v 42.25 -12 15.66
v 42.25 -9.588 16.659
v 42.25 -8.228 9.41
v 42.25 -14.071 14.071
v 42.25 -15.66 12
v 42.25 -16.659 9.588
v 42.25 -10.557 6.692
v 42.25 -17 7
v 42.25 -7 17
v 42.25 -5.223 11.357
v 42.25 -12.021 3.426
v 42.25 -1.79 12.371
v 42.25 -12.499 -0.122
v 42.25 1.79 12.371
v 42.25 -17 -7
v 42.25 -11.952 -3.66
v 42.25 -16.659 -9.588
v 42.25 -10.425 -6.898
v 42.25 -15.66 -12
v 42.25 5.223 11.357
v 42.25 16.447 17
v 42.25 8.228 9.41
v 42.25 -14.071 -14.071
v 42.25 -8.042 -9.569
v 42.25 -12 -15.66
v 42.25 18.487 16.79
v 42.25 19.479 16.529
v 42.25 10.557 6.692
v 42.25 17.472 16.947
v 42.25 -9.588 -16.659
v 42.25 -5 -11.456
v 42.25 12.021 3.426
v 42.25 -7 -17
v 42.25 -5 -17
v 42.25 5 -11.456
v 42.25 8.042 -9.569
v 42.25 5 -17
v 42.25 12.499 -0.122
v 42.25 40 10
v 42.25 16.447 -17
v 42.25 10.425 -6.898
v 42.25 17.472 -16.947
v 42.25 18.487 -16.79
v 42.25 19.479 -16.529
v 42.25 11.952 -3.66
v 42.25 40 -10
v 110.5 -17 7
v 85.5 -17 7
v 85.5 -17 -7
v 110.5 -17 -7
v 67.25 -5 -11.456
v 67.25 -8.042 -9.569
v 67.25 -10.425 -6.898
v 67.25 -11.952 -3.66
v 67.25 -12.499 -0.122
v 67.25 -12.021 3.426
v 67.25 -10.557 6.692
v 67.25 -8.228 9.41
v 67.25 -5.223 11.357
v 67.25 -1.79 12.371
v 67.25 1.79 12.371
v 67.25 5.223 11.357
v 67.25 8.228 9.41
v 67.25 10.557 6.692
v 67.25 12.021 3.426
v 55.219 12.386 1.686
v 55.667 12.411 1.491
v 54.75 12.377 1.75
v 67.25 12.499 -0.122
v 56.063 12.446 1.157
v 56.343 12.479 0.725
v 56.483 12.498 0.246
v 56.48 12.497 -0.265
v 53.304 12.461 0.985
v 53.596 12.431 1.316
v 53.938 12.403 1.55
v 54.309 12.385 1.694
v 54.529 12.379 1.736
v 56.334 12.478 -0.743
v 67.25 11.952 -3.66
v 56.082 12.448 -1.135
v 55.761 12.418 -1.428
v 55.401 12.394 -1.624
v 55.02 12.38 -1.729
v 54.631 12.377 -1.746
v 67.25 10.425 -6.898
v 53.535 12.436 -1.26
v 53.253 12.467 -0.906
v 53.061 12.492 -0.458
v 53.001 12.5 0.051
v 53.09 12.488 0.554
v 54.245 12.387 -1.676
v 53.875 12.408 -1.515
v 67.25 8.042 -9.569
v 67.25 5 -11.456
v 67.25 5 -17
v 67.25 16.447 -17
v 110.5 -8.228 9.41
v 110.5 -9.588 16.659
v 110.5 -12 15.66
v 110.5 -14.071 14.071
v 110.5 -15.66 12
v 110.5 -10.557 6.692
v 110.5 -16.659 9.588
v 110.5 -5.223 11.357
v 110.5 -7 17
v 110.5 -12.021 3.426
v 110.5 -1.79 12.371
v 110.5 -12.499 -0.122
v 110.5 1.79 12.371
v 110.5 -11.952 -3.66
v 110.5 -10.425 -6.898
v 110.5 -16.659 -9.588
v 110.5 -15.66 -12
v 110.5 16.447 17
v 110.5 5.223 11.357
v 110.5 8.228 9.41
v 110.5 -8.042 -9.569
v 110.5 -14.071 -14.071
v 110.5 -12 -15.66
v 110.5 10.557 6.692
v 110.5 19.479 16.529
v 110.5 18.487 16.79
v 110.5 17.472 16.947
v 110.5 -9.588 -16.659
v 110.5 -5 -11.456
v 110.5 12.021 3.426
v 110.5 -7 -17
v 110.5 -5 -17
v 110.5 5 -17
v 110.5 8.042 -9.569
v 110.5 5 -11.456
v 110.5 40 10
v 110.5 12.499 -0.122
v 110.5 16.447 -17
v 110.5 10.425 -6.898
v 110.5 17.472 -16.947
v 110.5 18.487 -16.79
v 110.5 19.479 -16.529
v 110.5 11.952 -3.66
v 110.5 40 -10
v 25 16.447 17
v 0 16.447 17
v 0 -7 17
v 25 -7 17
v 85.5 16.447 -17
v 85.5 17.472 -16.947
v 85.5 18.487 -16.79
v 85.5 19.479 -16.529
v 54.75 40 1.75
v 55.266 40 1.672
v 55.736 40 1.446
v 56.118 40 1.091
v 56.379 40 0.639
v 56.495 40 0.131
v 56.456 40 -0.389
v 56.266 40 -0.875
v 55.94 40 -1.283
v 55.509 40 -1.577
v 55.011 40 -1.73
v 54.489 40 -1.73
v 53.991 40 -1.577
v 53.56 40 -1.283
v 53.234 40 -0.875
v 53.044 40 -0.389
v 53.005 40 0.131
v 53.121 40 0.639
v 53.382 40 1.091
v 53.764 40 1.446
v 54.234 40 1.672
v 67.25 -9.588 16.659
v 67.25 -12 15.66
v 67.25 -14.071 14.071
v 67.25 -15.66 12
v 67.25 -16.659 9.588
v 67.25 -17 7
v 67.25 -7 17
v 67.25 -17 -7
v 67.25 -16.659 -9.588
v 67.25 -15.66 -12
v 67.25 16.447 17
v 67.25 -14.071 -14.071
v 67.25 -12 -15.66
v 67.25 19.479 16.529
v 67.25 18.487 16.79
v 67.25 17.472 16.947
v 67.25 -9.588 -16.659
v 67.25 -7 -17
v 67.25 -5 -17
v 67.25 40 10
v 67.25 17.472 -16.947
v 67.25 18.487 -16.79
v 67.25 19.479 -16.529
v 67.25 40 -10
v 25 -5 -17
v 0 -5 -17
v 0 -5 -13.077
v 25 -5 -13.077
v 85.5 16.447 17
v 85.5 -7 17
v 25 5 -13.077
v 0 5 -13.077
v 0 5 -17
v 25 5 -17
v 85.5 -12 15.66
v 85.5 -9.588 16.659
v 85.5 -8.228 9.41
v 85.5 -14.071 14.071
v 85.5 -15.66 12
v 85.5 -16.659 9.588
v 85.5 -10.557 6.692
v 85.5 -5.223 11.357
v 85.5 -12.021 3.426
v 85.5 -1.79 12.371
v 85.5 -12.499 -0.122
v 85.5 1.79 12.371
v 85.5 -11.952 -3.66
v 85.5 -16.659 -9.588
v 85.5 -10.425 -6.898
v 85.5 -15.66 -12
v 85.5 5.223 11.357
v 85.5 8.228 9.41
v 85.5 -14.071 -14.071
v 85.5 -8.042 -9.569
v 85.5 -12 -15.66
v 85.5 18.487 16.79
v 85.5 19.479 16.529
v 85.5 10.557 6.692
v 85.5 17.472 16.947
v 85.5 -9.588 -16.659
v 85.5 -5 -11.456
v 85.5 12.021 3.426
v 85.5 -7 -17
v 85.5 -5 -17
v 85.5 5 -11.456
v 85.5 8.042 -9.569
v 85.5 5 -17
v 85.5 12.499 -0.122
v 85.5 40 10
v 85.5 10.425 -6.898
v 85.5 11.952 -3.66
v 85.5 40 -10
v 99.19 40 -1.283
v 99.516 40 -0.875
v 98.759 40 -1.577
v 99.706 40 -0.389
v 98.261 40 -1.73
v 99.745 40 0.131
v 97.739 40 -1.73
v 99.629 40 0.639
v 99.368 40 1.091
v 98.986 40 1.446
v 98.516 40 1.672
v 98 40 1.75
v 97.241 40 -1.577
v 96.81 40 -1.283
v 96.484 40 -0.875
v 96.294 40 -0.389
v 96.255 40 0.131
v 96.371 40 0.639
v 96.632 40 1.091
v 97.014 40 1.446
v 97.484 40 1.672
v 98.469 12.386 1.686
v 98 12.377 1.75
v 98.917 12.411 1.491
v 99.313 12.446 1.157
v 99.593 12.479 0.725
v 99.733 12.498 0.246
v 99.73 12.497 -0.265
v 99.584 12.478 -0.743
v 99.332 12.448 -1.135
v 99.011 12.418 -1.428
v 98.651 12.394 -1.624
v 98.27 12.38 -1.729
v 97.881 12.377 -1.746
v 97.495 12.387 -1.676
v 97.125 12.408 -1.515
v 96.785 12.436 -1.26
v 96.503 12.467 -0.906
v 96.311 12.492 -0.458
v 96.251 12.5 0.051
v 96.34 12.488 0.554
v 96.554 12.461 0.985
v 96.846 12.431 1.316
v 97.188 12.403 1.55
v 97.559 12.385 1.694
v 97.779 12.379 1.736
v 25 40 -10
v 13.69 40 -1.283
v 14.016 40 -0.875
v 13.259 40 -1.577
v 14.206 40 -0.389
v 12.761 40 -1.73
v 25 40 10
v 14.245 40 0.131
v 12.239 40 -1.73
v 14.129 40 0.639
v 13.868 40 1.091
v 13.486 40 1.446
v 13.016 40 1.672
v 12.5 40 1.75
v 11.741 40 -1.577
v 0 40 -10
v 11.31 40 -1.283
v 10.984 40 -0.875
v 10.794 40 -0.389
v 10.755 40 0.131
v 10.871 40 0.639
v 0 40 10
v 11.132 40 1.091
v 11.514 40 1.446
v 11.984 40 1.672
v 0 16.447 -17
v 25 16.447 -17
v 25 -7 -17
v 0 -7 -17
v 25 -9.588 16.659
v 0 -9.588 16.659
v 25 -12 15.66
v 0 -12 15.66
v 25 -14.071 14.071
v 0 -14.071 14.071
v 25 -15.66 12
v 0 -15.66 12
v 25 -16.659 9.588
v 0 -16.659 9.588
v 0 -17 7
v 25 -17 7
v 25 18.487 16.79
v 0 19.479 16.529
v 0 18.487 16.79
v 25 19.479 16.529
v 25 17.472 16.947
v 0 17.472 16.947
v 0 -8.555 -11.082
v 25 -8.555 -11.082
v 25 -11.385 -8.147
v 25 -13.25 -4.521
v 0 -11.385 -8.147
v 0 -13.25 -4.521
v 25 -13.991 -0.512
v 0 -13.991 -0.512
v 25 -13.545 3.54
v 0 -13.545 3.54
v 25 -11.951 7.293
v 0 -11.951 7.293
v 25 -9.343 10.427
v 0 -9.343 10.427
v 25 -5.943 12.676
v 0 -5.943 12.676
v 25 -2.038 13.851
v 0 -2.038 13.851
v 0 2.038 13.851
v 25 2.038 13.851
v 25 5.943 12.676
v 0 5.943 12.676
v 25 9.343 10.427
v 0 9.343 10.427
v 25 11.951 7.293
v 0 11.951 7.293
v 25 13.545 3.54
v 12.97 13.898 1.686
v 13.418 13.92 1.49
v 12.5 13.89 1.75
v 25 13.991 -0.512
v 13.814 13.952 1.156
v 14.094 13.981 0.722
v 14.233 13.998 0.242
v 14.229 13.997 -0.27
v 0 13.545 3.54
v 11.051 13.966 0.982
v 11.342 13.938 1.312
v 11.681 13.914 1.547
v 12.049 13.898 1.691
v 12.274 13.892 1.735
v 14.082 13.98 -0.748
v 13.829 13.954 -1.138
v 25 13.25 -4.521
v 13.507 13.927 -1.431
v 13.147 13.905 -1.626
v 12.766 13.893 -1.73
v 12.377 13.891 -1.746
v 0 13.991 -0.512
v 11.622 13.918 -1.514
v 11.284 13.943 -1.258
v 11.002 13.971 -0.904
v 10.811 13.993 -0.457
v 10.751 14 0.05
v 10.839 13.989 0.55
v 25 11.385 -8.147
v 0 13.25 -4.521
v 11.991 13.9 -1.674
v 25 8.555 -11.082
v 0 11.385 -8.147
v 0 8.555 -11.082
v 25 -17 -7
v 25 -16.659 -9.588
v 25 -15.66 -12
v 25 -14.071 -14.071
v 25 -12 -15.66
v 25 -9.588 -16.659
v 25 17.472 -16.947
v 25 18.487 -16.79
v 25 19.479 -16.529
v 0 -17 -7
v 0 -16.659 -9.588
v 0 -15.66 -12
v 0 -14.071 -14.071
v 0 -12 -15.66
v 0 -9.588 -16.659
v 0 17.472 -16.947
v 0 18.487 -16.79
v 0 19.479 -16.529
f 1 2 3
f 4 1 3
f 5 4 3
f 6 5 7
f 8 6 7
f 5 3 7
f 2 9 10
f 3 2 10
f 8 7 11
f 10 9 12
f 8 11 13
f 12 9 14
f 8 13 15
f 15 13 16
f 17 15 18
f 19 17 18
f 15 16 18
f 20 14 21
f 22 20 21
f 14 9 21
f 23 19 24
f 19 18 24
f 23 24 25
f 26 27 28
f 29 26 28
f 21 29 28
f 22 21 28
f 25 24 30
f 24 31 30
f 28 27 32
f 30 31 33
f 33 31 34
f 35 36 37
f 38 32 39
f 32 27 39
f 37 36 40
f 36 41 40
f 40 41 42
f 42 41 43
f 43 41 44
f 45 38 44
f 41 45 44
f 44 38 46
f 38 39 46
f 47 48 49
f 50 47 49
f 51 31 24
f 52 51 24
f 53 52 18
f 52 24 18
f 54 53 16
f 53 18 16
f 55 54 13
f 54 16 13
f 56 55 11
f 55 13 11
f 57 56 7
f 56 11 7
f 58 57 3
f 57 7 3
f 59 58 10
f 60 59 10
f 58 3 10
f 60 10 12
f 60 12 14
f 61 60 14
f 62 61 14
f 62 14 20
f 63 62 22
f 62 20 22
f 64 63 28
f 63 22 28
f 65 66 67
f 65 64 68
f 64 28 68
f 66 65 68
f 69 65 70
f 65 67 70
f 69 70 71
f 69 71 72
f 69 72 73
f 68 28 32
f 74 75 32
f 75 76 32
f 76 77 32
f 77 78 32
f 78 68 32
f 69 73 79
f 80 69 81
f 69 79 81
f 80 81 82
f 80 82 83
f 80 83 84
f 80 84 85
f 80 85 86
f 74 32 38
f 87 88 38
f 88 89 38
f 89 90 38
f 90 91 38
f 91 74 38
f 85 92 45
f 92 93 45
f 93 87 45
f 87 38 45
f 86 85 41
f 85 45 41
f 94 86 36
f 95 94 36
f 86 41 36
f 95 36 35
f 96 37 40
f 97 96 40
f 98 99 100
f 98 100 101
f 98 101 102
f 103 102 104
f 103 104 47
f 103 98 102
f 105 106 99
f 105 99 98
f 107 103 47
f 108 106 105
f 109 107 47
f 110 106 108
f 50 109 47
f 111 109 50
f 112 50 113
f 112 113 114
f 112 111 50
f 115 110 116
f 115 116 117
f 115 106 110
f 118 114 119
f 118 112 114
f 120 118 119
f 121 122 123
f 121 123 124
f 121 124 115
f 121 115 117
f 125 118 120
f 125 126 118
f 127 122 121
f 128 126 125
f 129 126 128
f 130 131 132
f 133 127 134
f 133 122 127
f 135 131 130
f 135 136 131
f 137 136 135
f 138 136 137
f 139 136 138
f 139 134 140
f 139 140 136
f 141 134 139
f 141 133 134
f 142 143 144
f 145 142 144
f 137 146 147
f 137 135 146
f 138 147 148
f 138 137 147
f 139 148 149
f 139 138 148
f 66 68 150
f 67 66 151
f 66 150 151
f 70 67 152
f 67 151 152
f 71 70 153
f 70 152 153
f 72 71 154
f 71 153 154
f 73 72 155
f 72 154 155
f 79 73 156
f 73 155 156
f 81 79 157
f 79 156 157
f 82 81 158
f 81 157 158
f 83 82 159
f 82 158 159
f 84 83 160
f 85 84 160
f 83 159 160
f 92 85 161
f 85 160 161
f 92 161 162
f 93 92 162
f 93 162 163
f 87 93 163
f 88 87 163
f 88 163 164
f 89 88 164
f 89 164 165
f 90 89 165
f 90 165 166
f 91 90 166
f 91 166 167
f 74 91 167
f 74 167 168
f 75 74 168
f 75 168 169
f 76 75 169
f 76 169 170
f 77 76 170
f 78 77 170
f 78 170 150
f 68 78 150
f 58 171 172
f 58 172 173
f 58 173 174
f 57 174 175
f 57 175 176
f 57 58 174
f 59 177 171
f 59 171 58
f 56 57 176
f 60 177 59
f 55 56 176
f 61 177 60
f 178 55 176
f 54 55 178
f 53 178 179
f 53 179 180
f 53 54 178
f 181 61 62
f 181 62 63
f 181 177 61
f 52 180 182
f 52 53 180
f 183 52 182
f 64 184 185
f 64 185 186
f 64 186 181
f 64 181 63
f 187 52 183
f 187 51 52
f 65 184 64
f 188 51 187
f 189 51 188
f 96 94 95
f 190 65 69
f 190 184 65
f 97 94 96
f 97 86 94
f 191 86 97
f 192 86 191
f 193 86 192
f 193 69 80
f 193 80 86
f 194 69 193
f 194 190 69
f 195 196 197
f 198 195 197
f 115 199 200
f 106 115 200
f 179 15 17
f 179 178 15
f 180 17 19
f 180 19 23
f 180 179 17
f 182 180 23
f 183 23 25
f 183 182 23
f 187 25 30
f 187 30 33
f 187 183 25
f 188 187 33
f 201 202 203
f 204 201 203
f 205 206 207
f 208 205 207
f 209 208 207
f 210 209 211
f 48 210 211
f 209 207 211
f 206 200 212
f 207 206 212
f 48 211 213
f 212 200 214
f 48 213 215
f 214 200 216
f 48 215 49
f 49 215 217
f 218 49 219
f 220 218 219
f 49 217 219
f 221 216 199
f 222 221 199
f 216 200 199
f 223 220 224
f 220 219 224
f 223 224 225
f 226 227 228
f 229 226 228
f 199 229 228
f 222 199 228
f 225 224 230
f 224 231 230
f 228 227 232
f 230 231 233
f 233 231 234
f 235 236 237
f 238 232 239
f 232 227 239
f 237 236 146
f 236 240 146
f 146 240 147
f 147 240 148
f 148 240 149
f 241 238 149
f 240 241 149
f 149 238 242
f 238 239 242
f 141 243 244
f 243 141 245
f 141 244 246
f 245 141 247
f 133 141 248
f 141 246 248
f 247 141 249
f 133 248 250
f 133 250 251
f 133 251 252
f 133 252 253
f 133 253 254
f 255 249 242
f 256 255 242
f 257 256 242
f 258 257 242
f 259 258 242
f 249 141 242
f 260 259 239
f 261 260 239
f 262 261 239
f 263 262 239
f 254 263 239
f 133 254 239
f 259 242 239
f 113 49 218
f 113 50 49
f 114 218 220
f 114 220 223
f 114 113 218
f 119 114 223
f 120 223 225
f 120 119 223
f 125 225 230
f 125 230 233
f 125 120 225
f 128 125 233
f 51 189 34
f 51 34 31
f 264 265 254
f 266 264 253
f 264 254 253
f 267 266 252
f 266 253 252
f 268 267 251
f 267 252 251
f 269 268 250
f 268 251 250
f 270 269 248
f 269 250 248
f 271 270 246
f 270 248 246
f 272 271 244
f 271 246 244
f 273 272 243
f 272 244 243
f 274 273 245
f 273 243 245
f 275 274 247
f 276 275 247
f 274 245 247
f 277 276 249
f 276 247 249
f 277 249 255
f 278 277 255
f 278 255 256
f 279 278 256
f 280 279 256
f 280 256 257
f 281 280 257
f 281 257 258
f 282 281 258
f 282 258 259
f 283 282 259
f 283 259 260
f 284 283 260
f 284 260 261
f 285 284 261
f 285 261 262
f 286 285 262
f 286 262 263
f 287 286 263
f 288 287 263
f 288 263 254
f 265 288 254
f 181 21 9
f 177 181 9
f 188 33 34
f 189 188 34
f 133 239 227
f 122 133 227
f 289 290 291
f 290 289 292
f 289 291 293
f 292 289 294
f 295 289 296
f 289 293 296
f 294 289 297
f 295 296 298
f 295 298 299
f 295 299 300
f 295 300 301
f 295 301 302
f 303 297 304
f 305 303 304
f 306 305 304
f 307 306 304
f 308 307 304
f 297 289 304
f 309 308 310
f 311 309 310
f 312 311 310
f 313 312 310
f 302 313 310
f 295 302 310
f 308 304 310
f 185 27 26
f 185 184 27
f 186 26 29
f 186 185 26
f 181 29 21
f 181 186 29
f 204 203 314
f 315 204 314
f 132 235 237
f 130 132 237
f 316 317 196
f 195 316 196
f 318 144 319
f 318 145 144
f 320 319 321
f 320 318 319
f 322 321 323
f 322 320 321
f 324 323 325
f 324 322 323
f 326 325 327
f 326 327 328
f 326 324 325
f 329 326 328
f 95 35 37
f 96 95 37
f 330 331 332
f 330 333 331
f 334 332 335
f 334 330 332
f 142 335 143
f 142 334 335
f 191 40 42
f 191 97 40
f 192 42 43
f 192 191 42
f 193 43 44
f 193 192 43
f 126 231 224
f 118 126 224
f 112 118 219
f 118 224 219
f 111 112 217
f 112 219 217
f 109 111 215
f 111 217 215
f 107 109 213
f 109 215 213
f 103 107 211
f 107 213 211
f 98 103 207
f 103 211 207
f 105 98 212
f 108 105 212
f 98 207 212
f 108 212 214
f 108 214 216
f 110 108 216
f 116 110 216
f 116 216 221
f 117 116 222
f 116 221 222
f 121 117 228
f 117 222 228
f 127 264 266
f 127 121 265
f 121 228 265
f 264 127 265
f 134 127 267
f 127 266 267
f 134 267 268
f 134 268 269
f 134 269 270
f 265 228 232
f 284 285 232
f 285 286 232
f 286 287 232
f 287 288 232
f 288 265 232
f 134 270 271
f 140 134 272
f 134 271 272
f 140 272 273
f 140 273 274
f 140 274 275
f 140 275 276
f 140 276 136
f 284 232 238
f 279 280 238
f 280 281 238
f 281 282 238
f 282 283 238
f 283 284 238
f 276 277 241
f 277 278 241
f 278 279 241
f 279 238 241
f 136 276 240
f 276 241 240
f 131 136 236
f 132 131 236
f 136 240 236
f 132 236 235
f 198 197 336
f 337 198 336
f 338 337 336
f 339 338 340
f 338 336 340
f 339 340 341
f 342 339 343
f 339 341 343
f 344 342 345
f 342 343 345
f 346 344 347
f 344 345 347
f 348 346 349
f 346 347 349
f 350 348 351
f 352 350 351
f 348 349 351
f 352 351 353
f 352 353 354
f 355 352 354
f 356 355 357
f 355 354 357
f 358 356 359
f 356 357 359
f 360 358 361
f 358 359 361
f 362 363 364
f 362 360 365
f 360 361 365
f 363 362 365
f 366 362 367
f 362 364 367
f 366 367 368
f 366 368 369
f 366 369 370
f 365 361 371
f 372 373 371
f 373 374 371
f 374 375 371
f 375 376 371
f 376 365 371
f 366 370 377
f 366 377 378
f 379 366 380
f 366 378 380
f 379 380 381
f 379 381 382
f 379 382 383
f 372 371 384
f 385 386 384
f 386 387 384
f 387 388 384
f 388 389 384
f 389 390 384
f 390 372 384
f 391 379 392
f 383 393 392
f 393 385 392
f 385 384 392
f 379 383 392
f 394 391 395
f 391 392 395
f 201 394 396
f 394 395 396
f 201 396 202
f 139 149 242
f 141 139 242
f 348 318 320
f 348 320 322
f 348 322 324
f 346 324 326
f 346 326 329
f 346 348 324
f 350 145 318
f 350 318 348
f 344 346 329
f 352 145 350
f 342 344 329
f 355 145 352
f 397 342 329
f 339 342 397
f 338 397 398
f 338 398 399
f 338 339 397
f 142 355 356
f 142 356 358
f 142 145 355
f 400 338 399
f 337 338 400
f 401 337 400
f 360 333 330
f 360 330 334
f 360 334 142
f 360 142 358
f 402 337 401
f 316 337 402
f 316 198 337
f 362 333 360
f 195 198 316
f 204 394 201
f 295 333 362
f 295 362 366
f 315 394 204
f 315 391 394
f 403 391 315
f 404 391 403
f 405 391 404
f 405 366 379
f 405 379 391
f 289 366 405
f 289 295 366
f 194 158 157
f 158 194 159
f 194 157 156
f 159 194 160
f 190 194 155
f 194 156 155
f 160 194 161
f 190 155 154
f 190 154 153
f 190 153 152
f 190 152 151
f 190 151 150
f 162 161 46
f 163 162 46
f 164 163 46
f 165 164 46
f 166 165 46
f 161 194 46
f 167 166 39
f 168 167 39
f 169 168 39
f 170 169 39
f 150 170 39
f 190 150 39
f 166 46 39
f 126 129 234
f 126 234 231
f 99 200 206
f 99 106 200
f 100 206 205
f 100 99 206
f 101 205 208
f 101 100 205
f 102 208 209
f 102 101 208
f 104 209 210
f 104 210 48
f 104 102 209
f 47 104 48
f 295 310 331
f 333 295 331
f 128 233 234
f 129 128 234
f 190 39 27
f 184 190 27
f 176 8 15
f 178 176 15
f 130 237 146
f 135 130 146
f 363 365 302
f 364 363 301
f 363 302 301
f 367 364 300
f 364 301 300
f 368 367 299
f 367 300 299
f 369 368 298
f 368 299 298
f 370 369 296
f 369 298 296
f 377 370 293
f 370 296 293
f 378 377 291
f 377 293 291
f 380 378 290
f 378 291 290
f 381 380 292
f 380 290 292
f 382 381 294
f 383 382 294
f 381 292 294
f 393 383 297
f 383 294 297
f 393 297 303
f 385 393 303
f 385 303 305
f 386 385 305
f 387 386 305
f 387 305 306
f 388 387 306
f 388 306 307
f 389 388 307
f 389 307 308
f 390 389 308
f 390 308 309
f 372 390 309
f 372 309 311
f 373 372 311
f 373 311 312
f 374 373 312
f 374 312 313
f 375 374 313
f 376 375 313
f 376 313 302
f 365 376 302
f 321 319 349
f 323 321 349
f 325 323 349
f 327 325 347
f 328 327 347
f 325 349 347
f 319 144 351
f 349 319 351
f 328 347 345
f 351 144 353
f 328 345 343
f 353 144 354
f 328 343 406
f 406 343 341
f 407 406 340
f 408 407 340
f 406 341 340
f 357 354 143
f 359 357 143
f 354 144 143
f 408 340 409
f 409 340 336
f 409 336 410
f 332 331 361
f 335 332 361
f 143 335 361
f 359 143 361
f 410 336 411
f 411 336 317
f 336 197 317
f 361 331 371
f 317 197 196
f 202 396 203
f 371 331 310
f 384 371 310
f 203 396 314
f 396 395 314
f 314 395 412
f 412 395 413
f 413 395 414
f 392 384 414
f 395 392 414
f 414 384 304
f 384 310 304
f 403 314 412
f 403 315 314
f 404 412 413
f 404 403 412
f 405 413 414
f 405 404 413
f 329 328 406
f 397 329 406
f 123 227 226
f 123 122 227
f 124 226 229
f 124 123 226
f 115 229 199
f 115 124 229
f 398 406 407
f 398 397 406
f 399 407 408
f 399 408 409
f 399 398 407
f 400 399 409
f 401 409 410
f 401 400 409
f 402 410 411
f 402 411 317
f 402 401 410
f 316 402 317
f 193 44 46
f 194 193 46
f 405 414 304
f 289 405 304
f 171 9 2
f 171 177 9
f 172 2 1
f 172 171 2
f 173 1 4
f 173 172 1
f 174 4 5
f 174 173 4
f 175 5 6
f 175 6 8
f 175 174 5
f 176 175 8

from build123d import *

# Parameters (mm, degrees)
ZOOM_LENSE_MOUNT_DEPTH = 25
SPEC_START             = 42.25
SPEC_MOUNT1_DEPTH      = 25
SPEC_START_2           = 85.5
SPEC_MOUNT_2_DEPTH     = 25
FILLET1_R              = 10
FILLET2_R              = 10
FILLET3_R              = 10
SKETCH2_R              = 1.75
CUT_EXTRUDE1_DEPTH     = 30
SKETCH3_R              = 1.75
CUT_EXTRUDE2_DEPTH     = 30
SKETCH4_R              = 1.75
CUT_EXTRUDE3_DEPTH     = 30


with BuildPart() as part:
    # Sketch1 → zoom lense mount (new body)
    with BuildSketch(Plane(origin=(0, 0, 0), x_dir=(0, 0, -1), z_dir=(1, 0, 0))):
        with BuildLine():
            Line((10, 40), (-10, 40))
            Line((-10, 40), (-17, 18))
            Line((-17, 18), (-17, -17))
            Line((-17, -17), (17, -17))
            Line((17, -17), (17, -5))
            Line((17, -5), (13.076696831, -5))
            ThreePointArc((13.076696831, -5), (-14, 0), (13.076696831, 5))
            Line((13.076696831, 5), (17, 5))
            Line((17, 5), (17, 18))
            Line((17, 18), (10, 40))
        make_face()
    extrude(amount=ZOOM_LENSE_MOUNT_DEPTH)

    # Fillet1
    fillet1_edges = [part.edges().sort_by_distance(p)[0] for p in [
        (12.5, -17, -17),
        (12.5, 18, -17),
        (12.5, -17, 17),
        (12.5, 18, 17),
    ]]
    fillet(fillet1_edges, radius=FILLET1_R)

    # Sketch4 → Cut-Extrude3 (cut)
    with BuildSketch(Plane(origin=(0, 40, 0), x_dir=(1, 0, 0), z_dir=(0, 1, 0))):
        with Locations((12.5, 0)):
            Circle(SKETCH4_R)
    extrude(amount=-CUT_EXTRUDE3_DEPTH, mode=Mode.SUBTRACT)


with BuildPart() as body_2:
    # Sketch1<4> → spec mount1 (new body)
    with BuildSketch(Plane(origin=(0, 0, 0), x_dir=(0, 0, -1), z_dir=(1, 0, 0)).offset(SPEC_START)):
        with BuildLine():
            Line((10, 40), (-10, 40))
            Line((-10, 40), (-17, 18))
            Line((-17, 18), (-17, -17))
            Line((-17, -17), (17, -17))
            Line((17, -17), (17, -5))
            Line((17, -5), (11.456439237, -5))
            ThreePointArc((11.456439237, -5), (-12.5, 0), (11.456439237, 5))
            Line((11.456439237, 5), (17, 5))
            Line((17, 5), (17, 18))
            Line((17, 18), (10, 40))
        make_face()
    extrude(amount=SPEC_MOUNT1_DEPTH)

    # Fillet2
    fillet2_edges = [body_2.edges().sort_by_distance(p)[0] for p in [
        (54.75, -17, -17),
        (54.75, 18, -17),
        (54.75, -17, 17),
        (54.75, 18, 17),
    ]]
    fillet(fillet2_edges, radius=FILLET2_R)

    # Sketch3 → Cut-Extrude2 (cut)
    with BuildSketch(Plane(origin=(0, 40, 0), x_dir=(1, 0, 0), z_dir=(0, 1, 0))):
        with Locations((54.75, 0)):
            Circle(SKETCH3_R)
    extrude(amount=-CUT_EXTRUDE2_DEPTH, mode=Mode.SUBTRACT)


with BuildPart() as body_3:
    # Sketch1<5> → spec mount 2 (new body)
    with BuildSketch(Plane(origin=(0, 0, 0), x_dir=(0, 0, -1), z_dir=(1, 0, 0)).offset(SPEC_START_2)):
        with BuildLine():
            Line((10, 40), (-10, 40))
            Line((-10, 40), (-17, 18))
            Line((-17, 18), (-17, -17))
            Line((-17, -17), (17, -17))
            Line((17, -17), (17, -5))
            Line((17, -5), (11.456439237, -5))
            ThreePointArc((11.456439237, -5), (-12.5, 0), (11.456439237, 5))
            Line((11.456439237, 5), (17, 5))
            Line((17, 5), (17, 18))
            Line((17, 18), (10, 40))
        make_face()
    extrude(amount=SPEC_MOUNT_2_DEPTH)

    # Fillet3
    fillet3_edges = [body_3.edges().sort_by_distance(p)[0] for p in [
        (98, -17, -17),
        (98, 18, -17),
        (98, -17, 17),
        (98, 18, 17),
    ]]
    fillet(fillet3_edges, radius=FILLET3_R)

    # Sketch2 → Cut-Extrude1 (cut)
    with BuildSketch(Plane(origin=(0, 40, 0), x_dir=(1, 0, 0), z_dir=(0, 1, 0))):
        with Locations((98, 0)):
            Circle(SKETCH2_R)
    extrude(amount=-CUT_EXTRUDE1_DEPTH, mode=Mode.SUBTRACT)


solid = Compound([part.part, body_2.part, body_3.part])
